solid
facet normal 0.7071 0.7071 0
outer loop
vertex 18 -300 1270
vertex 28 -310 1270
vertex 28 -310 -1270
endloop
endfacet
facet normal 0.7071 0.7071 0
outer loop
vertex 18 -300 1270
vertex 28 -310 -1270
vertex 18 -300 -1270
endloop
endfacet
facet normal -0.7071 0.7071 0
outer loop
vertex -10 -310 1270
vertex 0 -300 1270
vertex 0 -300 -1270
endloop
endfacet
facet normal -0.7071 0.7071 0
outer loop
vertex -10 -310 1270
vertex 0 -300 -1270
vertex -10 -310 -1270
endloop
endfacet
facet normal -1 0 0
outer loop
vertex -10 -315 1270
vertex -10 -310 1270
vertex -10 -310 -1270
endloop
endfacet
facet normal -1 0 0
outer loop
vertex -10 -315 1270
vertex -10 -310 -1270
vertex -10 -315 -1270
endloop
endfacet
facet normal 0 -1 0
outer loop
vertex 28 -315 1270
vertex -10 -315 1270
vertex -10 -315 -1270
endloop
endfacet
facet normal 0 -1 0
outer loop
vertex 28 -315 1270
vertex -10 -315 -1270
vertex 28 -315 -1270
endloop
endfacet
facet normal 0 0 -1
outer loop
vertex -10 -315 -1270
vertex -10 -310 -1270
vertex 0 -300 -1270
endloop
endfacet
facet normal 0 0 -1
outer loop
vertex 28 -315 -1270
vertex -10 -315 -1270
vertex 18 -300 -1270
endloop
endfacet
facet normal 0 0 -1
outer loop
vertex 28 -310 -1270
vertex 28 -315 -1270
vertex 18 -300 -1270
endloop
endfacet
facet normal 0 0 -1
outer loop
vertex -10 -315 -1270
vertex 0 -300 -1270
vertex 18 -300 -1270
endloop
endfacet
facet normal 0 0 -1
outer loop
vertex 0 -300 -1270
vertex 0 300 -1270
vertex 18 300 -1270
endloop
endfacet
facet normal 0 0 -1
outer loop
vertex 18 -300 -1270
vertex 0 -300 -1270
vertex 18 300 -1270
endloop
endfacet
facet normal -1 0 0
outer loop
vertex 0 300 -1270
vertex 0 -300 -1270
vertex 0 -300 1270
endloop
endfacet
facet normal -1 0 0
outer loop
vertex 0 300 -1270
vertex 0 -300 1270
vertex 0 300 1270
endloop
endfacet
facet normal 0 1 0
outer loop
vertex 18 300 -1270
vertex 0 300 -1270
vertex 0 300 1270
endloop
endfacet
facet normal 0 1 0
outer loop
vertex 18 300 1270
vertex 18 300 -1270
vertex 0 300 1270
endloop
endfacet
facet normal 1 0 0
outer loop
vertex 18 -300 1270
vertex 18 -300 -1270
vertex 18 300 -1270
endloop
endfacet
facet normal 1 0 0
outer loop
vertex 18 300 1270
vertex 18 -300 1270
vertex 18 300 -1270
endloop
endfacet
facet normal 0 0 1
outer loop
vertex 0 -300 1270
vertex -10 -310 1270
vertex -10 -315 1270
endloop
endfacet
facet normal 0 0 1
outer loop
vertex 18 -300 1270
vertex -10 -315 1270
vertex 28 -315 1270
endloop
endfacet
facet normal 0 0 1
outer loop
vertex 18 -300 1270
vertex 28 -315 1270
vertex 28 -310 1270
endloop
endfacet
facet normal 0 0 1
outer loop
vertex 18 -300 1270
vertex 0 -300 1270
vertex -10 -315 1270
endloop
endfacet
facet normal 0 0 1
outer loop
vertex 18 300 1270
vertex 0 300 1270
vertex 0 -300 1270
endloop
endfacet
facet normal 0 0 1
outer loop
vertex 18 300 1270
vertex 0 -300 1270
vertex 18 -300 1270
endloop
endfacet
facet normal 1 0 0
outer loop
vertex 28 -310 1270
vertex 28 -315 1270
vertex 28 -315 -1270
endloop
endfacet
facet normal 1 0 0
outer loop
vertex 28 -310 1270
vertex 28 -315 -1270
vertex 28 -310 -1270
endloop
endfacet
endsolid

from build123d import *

# Parameters (mm, degrees)
F0_W     = 600
F0_H     = 540
F1_DEPTH = 18
F0_H_2   = 2000
F2_DEPTH = 18
F4_DEPTH = 2540


with BuildPart() as f1:
    # F0 (on Right) → F1 (new body)
    with BuildSketch(Plane.YZ):
        with Locations((0, 1000)):
            Rectangle(F0_W, F0_H)
    extrude(amount=F1_DEPTH)

    # F0 (on Right) → F2 (join)
    with BuildSketch(Plane.YZ):
        with Locations((0, -270)):
            Rectangle(F0_W, F0_H_2)
    extrude(amount=F2_DEPTH)

    # F3 (on face) → F4 (join)
    with BuildSketch(Plane.XY.offset(1270)):
        Polygon((18, -300), (0, -300), (-10, -310), (-10, -315), (28, -315), (28, -310), align=None)
    extrude(amount=-F4_DEPTH)


solid = f1.part
